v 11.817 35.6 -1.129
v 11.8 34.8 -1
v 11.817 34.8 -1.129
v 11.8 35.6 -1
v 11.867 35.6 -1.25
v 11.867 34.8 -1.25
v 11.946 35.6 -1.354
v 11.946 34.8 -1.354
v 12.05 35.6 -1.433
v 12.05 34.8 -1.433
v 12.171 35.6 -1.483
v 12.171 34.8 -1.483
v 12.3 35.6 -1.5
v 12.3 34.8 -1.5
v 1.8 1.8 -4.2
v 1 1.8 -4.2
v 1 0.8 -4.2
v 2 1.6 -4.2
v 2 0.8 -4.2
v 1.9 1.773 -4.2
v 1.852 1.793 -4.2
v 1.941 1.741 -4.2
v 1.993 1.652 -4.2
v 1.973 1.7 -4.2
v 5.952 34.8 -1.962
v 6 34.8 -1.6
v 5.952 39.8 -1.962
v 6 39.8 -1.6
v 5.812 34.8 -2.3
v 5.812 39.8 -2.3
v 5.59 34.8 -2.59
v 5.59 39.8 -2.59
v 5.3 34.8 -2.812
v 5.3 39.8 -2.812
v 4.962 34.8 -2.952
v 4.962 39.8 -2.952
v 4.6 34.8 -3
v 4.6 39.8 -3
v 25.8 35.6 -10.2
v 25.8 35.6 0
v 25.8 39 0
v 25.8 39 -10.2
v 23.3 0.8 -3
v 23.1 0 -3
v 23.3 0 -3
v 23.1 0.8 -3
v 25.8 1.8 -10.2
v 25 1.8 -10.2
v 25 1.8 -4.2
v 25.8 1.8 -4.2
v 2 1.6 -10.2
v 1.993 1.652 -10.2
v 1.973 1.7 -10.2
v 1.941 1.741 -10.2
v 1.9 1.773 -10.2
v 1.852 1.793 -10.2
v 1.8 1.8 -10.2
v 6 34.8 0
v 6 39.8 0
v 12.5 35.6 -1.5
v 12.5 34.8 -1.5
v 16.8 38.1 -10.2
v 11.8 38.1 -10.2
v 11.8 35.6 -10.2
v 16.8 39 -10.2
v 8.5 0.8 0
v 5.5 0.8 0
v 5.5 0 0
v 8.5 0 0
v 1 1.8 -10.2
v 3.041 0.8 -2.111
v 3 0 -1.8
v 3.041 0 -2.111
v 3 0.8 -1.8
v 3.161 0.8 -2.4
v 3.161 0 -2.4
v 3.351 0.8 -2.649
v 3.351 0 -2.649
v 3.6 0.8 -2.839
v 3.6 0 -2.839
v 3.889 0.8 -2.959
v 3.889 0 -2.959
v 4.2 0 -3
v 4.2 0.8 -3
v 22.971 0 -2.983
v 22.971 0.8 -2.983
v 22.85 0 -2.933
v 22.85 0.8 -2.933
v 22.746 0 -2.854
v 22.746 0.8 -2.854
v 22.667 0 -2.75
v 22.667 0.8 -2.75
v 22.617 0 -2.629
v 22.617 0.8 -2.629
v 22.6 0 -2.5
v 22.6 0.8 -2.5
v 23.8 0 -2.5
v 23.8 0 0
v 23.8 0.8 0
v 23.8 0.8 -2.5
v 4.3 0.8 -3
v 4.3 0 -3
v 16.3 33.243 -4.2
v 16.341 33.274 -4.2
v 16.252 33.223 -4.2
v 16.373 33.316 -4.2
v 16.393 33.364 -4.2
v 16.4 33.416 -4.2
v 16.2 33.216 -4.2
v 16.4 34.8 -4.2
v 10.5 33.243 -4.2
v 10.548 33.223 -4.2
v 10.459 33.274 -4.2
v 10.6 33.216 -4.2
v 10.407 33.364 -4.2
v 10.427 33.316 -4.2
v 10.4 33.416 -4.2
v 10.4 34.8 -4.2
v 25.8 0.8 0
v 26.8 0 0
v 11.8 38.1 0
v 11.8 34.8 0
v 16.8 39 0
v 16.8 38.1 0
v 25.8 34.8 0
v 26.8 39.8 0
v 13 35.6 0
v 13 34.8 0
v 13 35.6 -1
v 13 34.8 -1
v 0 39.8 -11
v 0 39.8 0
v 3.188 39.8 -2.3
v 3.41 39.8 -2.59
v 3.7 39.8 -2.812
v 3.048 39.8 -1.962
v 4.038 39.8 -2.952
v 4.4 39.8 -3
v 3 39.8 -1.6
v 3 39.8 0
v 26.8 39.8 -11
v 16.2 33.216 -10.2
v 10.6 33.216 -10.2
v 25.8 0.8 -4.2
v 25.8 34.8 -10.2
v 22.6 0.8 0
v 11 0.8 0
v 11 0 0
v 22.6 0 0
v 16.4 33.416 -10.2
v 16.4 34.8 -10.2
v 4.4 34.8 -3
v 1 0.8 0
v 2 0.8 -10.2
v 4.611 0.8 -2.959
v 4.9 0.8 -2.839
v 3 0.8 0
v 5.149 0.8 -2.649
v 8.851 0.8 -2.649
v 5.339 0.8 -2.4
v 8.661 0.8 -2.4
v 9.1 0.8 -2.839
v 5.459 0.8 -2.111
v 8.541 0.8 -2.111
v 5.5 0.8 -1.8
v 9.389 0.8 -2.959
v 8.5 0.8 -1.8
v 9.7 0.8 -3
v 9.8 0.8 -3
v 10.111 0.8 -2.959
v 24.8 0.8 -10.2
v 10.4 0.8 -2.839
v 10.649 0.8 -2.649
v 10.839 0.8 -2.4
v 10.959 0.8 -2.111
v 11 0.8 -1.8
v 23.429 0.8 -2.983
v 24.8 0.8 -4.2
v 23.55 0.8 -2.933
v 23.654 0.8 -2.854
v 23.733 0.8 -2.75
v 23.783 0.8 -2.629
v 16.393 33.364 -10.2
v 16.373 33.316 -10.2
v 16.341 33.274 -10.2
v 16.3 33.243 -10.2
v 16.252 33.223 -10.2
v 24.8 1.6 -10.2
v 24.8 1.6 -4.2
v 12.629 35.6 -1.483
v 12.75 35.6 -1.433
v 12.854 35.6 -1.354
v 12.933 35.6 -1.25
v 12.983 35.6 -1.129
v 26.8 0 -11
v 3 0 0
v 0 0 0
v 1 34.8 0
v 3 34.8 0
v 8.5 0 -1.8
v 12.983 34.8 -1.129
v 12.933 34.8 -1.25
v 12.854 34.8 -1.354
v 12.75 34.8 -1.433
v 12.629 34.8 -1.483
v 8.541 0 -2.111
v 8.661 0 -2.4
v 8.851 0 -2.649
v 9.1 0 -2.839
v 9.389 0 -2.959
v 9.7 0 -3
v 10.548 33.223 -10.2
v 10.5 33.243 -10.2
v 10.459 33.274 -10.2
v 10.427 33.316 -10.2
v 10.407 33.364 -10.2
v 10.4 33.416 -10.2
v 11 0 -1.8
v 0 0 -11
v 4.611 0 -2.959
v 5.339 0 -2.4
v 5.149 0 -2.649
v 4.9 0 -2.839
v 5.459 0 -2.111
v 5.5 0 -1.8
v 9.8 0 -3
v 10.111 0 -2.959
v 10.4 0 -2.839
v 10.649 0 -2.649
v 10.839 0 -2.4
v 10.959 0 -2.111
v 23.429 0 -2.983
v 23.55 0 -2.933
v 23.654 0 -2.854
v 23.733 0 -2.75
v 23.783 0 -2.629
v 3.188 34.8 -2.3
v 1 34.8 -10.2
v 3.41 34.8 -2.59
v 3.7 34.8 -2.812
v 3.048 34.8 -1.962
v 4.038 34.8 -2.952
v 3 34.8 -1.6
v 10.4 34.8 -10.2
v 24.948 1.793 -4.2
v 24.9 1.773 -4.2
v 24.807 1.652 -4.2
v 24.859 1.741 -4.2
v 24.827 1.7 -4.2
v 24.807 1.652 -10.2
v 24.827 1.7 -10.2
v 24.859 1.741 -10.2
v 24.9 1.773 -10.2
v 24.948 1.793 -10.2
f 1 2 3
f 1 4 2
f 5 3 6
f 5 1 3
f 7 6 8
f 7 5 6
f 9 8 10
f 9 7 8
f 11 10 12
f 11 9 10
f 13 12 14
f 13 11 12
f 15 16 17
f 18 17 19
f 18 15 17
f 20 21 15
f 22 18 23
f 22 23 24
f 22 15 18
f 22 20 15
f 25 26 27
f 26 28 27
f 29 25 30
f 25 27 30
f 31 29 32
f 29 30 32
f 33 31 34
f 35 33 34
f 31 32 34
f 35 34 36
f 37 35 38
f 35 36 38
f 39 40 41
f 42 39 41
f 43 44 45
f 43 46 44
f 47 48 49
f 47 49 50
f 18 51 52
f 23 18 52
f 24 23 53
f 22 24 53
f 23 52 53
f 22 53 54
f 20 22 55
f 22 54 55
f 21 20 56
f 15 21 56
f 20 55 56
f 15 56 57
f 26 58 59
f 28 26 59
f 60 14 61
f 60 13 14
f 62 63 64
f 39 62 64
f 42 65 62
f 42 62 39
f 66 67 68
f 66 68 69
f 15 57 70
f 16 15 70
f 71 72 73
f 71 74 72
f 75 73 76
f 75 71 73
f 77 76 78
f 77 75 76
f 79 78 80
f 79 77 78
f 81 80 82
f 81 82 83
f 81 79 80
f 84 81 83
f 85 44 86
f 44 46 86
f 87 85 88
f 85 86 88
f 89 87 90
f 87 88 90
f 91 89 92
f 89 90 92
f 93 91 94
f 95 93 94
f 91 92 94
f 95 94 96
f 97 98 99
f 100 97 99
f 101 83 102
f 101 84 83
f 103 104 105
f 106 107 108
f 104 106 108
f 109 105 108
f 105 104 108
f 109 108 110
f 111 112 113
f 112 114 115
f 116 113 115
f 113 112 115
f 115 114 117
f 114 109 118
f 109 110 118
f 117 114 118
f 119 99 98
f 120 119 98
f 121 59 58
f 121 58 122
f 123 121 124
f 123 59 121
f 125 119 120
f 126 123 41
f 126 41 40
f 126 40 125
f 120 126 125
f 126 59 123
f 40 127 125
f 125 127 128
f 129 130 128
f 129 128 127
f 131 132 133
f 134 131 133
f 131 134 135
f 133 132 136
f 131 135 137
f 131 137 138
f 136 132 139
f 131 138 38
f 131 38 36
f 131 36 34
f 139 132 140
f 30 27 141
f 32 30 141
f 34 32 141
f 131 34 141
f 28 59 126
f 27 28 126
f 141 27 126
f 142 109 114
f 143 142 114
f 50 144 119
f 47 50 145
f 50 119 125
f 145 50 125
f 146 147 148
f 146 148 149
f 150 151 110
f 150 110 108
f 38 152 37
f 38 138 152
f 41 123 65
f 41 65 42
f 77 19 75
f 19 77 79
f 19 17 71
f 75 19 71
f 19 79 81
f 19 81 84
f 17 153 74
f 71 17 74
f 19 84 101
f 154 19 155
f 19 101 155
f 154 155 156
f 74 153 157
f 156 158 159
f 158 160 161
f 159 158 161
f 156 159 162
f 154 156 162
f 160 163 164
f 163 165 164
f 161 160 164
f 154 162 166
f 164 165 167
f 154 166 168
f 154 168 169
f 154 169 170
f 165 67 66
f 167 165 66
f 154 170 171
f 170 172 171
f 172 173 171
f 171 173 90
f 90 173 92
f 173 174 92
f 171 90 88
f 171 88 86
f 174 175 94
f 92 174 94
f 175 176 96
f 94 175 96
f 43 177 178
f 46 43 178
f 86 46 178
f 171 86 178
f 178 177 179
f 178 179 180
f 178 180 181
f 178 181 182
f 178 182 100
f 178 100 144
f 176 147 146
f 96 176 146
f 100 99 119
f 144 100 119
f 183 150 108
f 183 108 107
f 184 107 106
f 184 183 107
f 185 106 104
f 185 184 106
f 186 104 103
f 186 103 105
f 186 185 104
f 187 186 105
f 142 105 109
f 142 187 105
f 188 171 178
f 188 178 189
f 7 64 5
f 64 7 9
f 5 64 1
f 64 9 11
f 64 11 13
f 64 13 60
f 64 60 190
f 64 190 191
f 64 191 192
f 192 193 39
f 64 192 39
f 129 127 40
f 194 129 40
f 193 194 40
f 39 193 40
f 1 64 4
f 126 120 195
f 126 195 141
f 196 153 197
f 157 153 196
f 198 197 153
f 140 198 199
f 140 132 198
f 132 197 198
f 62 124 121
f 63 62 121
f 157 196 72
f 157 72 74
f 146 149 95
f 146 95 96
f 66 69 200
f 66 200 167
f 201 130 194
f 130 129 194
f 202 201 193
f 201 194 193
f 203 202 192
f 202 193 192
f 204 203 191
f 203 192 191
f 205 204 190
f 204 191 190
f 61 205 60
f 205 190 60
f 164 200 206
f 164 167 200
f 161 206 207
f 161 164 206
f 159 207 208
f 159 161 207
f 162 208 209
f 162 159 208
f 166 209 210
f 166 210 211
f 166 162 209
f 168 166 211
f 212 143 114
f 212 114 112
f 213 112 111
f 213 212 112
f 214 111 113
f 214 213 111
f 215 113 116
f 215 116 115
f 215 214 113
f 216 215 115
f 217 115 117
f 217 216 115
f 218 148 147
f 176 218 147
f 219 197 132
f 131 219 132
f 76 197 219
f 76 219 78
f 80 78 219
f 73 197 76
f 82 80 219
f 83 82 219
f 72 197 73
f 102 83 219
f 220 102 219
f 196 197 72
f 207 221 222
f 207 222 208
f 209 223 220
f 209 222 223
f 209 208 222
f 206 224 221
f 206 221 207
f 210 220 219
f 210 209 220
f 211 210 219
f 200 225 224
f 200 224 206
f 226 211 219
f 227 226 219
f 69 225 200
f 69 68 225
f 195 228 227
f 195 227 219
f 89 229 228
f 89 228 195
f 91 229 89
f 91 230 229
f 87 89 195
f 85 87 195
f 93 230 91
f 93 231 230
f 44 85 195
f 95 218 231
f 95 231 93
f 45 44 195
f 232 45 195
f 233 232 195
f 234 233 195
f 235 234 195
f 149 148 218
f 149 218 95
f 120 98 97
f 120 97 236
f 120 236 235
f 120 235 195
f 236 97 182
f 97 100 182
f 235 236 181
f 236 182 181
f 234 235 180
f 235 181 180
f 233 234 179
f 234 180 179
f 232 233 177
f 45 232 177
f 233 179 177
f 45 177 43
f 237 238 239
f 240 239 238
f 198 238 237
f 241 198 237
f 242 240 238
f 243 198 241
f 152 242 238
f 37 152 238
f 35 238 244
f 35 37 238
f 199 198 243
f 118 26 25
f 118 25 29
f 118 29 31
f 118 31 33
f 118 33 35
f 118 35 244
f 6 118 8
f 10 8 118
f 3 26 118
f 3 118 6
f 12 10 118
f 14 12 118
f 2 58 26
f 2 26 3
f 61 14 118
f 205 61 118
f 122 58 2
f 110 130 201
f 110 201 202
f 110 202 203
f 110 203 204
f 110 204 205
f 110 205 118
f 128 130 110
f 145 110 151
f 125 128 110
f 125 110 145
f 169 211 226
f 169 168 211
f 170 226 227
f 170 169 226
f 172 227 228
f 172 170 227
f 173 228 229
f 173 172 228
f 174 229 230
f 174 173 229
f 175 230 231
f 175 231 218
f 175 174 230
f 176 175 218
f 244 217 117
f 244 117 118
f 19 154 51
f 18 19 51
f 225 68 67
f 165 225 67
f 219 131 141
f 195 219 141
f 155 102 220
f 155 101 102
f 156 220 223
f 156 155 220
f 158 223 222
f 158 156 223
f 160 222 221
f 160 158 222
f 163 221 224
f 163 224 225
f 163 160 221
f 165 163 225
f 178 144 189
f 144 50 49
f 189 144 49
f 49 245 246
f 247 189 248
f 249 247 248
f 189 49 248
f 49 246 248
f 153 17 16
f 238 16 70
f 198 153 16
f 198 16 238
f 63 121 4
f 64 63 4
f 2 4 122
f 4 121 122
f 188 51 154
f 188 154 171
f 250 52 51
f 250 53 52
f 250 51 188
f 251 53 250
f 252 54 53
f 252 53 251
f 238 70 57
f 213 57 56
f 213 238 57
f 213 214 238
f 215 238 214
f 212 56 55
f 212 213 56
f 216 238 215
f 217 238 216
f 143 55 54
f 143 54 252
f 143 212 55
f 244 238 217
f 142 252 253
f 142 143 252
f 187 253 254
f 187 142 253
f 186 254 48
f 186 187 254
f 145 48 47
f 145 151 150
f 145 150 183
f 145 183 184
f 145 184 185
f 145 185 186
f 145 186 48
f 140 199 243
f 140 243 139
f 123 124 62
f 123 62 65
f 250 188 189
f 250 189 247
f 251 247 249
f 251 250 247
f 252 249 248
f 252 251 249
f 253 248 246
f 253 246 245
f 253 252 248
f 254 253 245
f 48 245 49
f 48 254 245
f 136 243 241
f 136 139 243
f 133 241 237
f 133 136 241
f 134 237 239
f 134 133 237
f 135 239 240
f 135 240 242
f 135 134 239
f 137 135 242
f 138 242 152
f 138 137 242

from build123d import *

# Parameters (mm, degrees)
SKETCH_3_W          = 26.8
SKETCH_3_H          = 39.8
EXTRUDE_3_DEPTH     = 11
SKETCH_3_3_W        = 24.8
SKETCH_3_3_H        = 34
SKETCH_3_3_W_2      = 9
SKETCH_3_3_H_2      = 3.4
CUT_EXTRUDE_1_DEPTH = 10.2
SKETCH_3_4_W        = 3
SKETCH_3_4_H        = 5
CUT_EXTRUDE_2_DEPTH = 3
SKETCH_3_5_W        = 2.5
SKETCH_3_5_H        = 0.8
CUT_EXTRUDE_3_DEPTH = 3
SKETCH_3_6_W        = 1.2
SKETCH_3_6_H        = 0.8
CUT_EXTRUDE_4_DEPTH = 3
SKETCH_3_7_W        = 1.2
SKETCH_3_7_H        = 0.8
CUT_EXTRUDE_5_DEPTH = 1.5
EXTRUDE_4_DEPTH     = 6
FILLET_1_R          = 1.4
FILLET_2_R          = 1.2
FILLET_3_R          = 0.5


with BuildPart() as part:
    # Sketch 3 → Extrude 3 (new body)
    with BuildSketch(Plane.XY):
        with Locations((13.4, 19.9)):
            Rectangle(SKETCH_3_W, SKETCH_3_H)
    extrude(amount=-EXTRUDE_3_DEPTH)

    # Sketch 3_3 → Cut-Extrude 1 (cut)
    with BuildSketch(Plane.XY):
        with Locations((13.4, 17.8)):
            Rectangle(SKETCH_3_3_W, SKETCH_3_3_H)
        with Locations((21.3, 37.3)):
            Rectangle(SKETCH_3_3_W_2, SKETCH_3_3_H_2)
        Polygon((11.8, 38.1), (11.8, 35.6), (13, 35.6), (16.8, 35.6), (16.8, 38.1), align=None)
    extrude(amount=-CUT_EXTRUDE_1_DEPTH, mode=Mode.SUBTRACT)

    # Sketch 3_4 → Cut-Extrude 2 (cut)
    with BuildSketch(Plane.XY):
        with Locations((4.5, 37.3)):
            Rectangle(SKETCH_3_4_W, SKETCH_3_4_H)
    extrude(amount=-CUT_EXTRUDE_2_DEPTH, mode=Mode.SUBTRACT)

    # Sketch 3_5 → Cut-Extrude 3 (cut)
    with BuildSketch(Plane.XY):
        with Locations((4.25, 0.4)):
            Rectangle(SKETCH_3_5_W, SKETCH_3_5_H)
        with Locations((9.75, 0.4)):
            Rectangle(SKETCH_3_5_W, SKETCH_3_5_H)
    extrude(amount=-CUT_EXTRUDE_3_DEPTH, mode=Mode.SUBTRACT)

    # Sketch 3_6 → Cut-Extrude 4 (cut)
    with BuildSketch(Plane.XY):
        with Locations((23.2, 0.4)):
            Rectangle(SKETCH_3_6_W, SKETCH_3_6_H)
    extrude(amount=-CUT_EXTRUDE_4_DEPTH, mode=Mode.SUBTRACT)

    # Sketch 3_7 → Cut-Extrude 5 (cut)
    with BuildSketch(Plane.XY):
        with Locations((12.4, 35.2)):
            Rectangle(SKETCH_3_7_W, SKETCH_3_7_H)
    extrude(amount=-CUT_EXTRUDE_5_DEPTH, mode=Mode.SUBTRACT)

    # Sketch 4 → Extrude 4 (add)
    with BuildSketch(Plane.XY.offset(-10.2)):
        with BuildLine():
            Line((10.4, 34.8), (16.4, 34.8))
            Line((16.4, 34.8), (16.4, 33.415875518))
            ThreePointArc((16.4, 33.415875518), (16.341421356, 33.274454162), (16.2, 33.215875518))
            Line((16.2, 33.215875518), (10.6, 33.215875518))
            ThreePointArc((10.6, 33.215875518), (10.458578644, 33.274454162), (10.4, 33.415875518))
            Line((10.4, 33.415875518), (10.4, 34.8))
        make_face()
        with BuildLine():
            Line((1, 0.8), (2, 0.8))
            Line((2, 0.8), (2, 1.6))
            ThreePointArc((2, 1.6), (1.941421356, 1.741421356), (1.8, 1.8))
            Line((1.8, 1.8), (1, 1.8))
            Line((1, 1.8), (1, 0.8))
        make_face()
        with BuildLine():
            Line((25.8, 0.8), (24.8, 0.8))
            Line((24.8, 0.8), (24.8, 1.6))
            ThreePointArc((24.8, 1.6), (24.858578644, 1.741421356), (25, 1.8))
            Line((25, 1.8), (25.8, 1.8))
            Line((25.8, 1.8), (25.8, 0.8))
        make_face()
    extrude(amount=EXTRUDE_4_DEPTH)

    # Fillet 1
    fillet_1_edges = [part.edges().sort_by_distance(p)[0] for p in [
        (3, 37.3, -3),
        (6, 37.3, -3),
    ]]
    fillet(fillet_1_edges, radius=FILLET_1_R)

    # Fillet 2
    fillet_2_edges = [part.edges().sort_by_distance(p)[0] for p in [
        (3, 0.4, -3),
        (5.5, 0.4, -3),
        (8.5, 0.4, -3),
        (11, 0.4, -3),
    ]]
    fillet(fillet_2_edges, radius=FILLET_2_R)

    # Fillet 3
    fillet_3_edges = [part.edges().sort_by_distance(p)[0] for p in [
        (23.8, 0.4, -3),
        (11.8, 35.2, -1.5),
        (13, 35.2, -1.5),
        (22.6, 0.4, -3),
    ]]
    fillet(fillet_3_edges, radius=FILLET_3_R)


solid = part.part
